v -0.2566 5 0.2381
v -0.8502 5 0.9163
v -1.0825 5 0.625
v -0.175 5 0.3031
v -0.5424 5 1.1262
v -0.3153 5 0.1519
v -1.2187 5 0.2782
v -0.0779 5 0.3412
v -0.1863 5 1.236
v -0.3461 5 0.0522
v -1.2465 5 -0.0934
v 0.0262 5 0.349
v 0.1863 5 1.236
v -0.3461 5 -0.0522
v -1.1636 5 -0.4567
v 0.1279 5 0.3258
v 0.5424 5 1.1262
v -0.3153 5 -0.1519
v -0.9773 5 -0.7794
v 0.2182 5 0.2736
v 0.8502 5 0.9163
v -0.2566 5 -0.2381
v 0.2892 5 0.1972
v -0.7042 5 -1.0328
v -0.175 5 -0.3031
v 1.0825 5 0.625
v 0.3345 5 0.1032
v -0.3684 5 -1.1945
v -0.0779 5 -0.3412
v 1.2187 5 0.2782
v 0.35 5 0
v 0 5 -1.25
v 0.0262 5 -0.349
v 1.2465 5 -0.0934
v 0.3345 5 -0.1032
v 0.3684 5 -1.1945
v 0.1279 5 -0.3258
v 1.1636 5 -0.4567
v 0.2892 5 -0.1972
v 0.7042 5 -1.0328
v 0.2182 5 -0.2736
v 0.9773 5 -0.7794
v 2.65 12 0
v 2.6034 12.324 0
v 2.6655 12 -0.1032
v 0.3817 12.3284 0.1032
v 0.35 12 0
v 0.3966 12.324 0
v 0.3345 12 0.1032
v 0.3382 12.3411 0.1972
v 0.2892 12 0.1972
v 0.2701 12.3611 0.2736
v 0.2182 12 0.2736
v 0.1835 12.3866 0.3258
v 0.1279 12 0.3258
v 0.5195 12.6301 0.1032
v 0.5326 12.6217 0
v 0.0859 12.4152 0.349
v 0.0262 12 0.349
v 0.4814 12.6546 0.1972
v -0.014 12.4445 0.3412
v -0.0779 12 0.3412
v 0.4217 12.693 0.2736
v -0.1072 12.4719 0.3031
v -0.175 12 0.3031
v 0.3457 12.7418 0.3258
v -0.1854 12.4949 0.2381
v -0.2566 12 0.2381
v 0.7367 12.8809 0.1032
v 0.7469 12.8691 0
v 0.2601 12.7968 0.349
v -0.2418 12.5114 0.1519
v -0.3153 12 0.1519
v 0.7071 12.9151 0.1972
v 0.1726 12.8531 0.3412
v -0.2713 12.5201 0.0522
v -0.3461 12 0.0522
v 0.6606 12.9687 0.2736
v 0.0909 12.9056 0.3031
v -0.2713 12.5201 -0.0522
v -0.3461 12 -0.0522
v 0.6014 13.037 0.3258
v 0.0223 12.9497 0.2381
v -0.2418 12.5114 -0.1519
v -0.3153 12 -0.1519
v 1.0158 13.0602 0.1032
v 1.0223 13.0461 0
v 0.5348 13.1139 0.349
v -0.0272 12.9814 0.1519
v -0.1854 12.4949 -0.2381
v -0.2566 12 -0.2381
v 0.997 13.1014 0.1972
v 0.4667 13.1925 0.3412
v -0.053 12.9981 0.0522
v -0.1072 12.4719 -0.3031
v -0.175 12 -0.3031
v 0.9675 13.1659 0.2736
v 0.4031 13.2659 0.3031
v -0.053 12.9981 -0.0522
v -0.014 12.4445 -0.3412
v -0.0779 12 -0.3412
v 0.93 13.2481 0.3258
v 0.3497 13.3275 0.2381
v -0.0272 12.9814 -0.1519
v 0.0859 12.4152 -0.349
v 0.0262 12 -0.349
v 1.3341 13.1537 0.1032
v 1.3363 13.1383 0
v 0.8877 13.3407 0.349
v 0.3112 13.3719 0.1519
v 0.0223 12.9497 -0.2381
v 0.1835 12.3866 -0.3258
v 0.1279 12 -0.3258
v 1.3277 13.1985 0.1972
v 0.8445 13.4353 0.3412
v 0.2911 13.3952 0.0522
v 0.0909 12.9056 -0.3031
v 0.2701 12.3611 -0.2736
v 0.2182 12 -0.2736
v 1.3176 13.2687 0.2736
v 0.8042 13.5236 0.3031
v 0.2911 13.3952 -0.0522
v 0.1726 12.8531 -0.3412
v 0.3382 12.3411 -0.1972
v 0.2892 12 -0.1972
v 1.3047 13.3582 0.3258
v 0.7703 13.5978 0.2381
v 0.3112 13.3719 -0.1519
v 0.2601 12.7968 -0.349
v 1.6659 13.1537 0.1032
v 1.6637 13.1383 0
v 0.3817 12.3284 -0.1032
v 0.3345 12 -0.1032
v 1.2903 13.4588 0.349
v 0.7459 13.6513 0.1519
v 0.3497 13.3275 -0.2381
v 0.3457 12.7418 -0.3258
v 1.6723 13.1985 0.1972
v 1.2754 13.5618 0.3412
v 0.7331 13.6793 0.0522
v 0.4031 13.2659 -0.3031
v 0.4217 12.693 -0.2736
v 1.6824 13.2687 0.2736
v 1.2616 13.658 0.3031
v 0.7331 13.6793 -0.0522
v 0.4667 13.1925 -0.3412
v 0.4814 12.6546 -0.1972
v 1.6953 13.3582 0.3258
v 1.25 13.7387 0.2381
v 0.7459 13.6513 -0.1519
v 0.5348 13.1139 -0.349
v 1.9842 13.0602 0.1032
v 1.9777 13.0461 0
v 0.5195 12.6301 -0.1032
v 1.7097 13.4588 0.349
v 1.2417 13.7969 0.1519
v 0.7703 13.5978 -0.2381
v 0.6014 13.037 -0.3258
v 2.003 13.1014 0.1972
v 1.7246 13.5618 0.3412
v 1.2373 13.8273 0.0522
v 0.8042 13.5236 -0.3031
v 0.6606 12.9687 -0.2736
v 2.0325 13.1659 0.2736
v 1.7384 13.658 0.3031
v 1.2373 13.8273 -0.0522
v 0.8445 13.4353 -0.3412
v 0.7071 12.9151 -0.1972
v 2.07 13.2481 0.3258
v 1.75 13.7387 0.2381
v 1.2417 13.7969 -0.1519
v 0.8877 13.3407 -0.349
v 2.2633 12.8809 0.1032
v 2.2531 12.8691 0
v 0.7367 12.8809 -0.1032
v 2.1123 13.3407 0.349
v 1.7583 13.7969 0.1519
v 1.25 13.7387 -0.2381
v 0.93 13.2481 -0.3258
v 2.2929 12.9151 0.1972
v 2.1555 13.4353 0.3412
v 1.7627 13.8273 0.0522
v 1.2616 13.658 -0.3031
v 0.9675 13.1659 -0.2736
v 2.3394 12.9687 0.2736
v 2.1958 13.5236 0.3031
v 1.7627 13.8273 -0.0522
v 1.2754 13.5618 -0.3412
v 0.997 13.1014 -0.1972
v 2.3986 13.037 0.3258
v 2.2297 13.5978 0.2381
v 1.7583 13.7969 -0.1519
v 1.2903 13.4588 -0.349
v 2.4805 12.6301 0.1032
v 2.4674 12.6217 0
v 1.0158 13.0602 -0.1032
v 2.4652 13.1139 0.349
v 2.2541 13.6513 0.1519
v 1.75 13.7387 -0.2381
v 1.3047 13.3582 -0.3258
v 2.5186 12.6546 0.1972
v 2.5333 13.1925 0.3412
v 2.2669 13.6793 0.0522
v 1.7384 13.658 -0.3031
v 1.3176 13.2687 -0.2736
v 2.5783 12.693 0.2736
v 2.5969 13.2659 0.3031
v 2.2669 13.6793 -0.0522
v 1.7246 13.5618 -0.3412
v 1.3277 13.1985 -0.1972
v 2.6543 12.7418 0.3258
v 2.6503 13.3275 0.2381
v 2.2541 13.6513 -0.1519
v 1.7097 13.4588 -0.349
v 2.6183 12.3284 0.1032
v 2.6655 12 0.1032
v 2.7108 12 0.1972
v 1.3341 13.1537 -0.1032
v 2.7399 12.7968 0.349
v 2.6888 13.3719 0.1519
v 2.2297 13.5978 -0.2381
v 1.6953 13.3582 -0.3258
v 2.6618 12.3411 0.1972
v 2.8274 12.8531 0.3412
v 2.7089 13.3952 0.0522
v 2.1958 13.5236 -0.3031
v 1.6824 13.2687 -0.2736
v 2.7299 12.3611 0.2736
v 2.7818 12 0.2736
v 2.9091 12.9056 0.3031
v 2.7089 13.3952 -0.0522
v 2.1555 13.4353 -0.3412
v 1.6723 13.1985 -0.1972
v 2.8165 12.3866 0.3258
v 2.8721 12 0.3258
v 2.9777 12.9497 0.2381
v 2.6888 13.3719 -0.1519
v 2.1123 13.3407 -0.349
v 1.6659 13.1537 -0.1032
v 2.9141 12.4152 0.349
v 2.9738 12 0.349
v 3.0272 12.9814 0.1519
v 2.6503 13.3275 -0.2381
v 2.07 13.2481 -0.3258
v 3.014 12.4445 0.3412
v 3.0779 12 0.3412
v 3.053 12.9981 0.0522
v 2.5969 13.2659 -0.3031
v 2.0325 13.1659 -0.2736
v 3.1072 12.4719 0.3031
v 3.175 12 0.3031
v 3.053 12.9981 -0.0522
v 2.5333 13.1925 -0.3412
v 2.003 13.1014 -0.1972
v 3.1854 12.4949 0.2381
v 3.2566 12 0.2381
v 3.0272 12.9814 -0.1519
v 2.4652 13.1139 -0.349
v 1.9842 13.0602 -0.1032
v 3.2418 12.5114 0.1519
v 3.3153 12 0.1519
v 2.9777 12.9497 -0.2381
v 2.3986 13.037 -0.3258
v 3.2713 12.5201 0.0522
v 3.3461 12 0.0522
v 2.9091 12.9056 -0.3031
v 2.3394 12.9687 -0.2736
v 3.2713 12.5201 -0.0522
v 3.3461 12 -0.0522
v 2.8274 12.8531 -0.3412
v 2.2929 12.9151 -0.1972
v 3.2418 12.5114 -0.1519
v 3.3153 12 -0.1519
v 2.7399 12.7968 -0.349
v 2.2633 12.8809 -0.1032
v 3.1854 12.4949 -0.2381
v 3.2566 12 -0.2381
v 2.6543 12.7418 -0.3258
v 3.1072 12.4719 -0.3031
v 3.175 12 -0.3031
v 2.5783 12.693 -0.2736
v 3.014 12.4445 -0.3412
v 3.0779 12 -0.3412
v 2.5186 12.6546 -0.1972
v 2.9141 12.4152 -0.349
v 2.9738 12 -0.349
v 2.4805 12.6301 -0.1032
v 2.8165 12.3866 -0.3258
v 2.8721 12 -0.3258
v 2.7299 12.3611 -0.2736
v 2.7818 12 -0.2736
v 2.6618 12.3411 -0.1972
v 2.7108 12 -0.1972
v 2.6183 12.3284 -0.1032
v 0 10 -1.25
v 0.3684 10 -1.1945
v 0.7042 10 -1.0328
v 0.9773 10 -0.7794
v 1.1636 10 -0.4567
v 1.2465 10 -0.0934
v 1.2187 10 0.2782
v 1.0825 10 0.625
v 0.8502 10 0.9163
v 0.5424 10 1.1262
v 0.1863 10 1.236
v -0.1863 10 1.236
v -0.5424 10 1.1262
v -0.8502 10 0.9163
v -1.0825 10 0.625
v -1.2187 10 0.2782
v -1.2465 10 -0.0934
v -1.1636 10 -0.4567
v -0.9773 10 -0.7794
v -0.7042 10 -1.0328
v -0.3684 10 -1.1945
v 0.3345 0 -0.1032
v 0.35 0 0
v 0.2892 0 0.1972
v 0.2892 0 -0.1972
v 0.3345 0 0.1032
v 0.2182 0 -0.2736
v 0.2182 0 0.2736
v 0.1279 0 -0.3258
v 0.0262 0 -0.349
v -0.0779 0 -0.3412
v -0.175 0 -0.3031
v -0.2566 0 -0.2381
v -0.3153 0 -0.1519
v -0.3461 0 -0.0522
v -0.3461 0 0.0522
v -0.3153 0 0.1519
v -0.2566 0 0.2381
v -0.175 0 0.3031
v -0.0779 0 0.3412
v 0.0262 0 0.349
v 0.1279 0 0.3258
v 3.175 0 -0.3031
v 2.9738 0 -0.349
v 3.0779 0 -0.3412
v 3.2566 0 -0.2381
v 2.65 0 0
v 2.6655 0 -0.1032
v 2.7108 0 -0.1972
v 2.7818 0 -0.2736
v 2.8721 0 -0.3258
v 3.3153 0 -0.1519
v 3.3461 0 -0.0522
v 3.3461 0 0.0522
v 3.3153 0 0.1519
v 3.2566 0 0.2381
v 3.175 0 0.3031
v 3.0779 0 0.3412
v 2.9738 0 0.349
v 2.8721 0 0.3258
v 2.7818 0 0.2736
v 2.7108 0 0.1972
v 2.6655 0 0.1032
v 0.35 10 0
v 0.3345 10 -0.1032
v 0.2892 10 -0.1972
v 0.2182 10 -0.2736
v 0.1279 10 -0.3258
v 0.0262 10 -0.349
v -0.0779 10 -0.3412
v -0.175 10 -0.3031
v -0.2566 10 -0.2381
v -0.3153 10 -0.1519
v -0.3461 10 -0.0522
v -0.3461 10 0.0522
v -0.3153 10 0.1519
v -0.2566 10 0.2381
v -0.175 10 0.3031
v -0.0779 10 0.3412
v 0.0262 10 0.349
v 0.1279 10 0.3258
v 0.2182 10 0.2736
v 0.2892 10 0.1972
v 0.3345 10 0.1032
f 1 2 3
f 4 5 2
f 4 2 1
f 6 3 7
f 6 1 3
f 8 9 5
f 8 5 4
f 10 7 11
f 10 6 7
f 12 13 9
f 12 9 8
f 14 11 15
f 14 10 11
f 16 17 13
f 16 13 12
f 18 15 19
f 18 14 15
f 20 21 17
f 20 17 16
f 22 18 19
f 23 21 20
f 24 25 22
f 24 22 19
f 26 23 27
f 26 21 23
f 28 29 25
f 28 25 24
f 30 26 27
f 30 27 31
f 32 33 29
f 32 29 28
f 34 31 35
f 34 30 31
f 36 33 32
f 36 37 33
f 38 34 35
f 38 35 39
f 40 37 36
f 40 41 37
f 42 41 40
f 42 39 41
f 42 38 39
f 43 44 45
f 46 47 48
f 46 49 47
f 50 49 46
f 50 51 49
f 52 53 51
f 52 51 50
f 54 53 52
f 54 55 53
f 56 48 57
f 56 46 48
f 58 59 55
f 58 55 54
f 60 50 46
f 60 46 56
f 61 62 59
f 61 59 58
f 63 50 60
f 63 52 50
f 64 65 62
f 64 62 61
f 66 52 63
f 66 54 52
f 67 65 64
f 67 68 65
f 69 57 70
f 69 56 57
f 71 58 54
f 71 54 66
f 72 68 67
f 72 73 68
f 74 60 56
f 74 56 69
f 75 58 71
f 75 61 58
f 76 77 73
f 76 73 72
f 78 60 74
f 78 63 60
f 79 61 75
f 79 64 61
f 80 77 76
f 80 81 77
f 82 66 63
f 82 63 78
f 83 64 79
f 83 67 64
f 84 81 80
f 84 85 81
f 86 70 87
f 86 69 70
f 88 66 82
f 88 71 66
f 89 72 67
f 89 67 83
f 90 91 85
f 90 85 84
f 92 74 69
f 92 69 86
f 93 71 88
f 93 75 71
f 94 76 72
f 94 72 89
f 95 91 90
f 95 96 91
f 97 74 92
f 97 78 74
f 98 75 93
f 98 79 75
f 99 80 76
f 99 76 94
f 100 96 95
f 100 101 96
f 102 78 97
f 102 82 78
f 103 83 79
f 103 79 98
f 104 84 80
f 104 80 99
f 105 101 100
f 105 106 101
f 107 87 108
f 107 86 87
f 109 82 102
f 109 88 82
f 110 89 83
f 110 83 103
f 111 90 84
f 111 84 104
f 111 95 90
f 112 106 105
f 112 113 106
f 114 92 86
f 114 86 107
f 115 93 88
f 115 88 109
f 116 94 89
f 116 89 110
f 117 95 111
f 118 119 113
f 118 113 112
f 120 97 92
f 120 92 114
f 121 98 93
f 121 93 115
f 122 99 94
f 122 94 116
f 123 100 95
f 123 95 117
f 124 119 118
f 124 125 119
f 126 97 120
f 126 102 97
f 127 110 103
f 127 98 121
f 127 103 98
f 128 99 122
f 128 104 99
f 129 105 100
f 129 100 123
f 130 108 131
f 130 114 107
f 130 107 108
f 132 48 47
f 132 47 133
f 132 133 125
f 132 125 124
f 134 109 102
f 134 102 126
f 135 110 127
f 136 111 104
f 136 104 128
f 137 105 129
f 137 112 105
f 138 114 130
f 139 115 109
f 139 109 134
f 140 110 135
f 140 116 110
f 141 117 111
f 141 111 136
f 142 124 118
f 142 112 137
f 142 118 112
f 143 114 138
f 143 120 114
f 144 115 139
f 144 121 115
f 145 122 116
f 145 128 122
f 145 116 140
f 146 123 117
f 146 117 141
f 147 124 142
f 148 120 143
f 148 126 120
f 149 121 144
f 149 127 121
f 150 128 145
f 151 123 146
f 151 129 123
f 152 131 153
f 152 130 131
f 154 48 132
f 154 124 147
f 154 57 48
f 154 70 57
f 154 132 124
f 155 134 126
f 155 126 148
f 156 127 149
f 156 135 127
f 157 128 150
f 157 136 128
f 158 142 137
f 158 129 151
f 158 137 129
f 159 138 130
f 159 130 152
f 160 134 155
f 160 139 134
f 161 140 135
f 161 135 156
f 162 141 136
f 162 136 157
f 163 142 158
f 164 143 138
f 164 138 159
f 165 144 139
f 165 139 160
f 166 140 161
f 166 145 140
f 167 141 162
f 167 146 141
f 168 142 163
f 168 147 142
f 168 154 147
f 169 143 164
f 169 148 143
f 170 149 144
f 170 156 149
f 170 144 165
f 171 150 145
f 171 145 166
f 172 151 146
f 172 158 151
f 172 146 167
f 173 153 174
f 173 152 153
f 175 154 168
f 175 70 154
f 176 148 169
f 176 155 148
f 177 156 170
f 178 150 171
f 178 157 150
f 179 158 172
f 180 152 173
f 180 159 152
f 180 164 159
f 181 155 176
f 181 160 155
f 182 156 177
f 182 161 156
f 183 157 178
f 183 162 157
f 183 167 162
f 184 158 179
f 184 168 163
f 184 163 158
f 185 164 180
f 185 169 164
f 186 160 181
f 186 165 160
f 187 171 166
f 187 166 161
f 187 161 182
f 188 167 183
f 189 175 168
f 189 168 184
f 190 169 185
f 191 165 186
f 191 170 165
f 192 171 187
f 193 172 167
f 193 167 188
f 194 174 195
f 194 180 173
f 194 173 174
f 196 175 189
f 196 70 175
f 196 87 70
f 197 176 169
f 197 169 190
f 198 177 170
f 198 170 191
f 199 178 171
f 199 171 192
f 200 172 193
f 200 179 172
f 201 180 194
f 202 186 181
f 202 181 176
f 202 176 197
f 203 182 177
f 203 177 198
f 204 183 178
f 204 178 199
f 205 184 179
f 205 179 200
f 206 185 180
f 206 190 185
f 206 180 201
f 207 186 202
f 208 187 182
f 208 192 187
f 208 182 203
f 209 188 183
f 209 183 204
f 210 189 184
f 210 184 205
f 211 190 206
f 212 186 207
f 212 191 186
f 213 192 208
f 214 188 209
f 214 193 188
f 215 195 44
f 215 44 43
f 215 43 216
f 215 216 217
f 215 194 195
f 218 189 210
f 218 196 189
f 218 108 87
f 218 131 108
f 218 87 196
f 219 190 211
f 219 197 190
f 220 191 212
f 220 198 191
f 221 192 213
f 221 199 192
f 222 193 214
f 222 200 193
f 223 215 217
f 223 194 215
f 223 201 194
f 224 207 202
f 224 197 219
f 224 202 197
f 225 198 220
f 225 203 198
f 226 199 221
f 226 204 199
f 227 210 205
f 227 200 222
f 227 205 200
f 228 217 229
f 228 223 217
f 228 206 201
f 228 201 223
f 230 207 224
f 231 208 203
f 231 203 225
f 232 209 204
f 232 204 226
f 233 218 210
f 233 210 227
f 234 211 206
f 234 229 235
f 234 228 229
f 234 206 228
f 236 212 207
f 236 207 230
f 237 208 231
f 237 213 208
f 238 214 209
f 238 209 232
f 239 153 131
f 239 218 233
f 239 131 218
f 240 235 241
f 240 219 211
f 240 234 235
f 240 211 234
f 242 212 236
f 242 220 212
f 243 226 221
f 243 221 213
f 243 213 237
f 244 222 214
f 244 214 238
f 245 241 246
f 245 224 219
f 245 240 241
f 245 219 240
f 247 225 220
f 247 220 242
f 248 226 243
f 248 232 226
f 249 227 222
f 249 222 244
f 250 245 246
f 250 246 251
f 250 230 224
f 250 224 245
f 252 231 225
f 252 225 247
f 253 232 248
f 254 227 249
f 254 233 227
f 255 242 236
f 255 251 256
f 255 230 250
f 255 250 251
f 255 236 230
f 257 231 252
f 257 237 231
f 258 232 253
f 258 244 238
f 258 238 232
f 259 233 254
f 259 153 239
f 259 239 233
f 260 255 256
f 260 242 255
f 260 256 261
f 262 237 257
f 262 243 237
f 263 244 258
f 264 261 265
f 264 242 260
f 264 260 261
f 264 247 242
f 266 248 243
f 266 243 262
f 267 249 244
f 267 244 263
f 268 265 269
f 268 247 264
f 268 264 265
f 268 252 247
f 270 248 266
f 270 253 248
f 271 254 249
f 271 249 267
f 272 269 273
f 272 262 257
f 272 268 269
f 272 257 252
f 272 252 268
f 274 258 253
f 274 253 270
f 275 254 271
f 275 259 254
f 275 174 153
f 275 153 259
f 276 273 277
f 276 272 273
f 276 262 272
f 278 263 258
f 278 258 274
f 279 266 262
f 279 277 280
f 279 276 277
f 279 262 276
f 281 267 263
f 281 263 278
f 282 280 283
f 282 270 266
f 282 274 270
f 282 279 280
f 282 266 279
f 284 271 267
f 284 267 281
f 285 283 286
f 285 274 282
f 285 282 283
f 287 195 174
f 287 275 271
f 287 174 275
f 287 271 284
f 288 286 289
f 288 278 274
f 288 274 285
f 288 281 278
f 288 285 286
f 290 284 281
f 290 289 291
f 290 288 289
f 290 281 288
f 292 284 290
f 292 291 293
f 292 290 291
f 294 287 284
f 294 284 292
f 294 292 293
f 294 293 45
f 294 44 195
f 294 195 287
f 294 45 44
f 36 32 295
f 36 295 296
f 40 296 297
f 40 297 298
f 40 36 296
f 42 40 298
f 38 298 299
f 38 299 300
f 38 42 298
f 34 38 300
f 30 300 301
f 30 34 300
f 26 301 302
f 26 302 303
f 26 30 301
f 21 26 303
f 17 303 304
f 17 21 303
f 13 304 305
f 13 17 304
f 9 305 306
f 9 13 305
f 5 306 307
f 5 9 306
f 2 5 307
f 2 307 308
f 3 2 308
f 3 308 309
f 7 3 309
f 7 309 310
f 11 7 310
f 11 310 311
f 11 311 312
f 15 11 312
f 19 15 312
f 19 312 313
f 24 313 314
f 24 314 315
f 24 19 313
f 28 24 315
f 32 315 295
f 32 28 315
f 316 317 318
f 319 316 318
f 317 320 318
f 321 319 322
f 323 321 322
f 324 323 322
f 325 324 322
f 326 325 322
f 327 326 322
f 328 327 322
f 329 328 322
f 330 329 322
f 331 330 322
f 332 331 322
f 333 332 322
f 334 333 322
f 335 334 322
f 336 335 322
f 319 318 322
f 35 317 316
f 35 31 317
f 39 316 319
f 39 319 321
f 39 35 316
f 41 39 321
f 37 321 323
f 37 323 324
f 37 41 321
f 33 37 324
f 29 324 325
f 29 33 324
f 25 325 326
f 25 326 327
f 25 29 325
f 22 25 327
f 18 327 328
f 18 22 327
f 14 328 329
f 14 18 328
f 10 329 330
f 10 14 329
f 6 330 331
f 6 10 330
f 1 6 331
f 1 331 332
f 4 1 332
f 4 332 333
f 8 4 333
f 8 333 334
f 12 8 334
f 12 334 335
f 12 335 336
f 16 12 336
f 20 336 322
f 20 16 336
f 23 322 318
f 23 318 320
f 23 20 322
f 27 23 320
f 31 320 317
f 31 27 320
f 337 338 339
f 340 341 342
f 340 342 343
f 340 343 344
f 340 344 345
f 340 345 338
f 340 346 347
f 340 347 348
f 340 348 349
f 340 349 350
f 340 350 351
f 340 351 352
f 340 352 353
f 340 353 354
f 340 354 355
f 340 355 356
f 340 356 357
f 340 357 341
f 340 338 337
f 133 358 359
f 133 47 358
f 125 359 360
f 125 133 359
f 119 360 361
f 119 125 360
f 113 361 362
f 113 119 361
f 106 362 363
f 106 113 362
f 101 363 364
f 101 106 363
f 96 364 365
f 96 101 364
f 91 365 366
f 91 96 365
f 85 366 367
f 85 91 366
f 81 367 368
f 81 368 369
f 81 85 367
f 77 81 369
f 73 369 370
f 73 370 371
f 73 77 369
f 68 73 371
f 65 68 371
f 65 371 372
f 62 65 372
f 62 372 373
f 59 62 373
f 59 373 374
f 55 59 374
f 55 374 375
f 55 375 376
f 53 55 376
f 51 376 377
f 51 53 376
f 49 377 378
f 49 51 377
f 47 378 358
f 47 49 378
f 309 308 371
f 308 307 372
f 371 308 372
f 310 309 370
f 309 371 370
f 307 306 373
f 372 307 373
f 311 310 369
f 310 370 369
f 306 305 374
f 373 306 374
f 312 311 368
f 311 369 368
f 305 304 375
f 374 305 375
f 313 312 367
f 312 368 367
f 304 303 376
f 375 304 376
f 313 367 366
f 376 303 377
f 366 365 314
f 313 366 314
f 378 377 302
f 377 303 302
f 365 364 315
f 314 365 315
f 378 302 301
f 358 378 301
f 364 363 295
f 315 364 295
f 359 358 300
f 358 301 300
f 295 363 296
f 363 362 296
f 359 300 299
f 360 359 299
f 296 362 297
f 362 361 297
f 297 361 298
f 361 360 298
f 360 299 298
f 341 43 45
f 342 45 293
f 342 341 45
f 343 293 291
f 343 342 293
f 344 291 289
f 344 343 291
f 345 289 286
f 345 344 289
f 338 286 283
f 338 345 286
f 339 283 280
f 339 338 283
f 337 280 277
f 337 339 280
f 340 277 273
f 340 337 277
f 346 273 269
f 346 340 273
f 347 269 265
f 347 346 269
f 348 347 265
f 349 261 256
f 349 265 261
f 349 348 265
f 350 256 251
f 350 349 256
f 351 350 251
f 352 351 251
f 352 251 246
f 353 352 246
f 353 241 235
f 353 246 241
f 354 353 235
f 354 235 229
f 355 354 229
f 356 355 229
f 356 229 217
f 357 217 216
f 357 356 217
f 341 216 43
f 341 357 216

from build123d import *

# Parameters (mm, degrees)
SKETCH_2_R      = 0.35
SKETCH_3_R      = 1.25
EXTRUDE_1_DEPTH = 5


with BuildPart() as part:
    # По траектории1: sweep along a path in Эскиз1
    with BuildLine(Plane.XY) as sweep_1_path:
        Line((0, 0), (0, 12))
        ThreePointArc((0, 12), (1.5, 13.5), (3, 12))
        Line((3, 12), (3, 0))
    # Эскиз2 → По траектории1 (sweep)
    with BuildSketch(Plane(origin=(0, 0, 0), x_dir=(1, 0, 0), z_dir=(0, 1, 0))):
        Circle(SKETCH_2_R)
    sweep(path=sweep_1_path.line)

    # Эскиз3 → Вытянуть1 (add)
    with BuildSketch(Plane.XZ.offset(-5)):
        with Locations(Location((0, 0, 0), (0, 0, 270))):
            Circle(SKETCH_3_R)
    extrude(amount=-EXTRUDE_1_DEPTH)


solid = part.part
